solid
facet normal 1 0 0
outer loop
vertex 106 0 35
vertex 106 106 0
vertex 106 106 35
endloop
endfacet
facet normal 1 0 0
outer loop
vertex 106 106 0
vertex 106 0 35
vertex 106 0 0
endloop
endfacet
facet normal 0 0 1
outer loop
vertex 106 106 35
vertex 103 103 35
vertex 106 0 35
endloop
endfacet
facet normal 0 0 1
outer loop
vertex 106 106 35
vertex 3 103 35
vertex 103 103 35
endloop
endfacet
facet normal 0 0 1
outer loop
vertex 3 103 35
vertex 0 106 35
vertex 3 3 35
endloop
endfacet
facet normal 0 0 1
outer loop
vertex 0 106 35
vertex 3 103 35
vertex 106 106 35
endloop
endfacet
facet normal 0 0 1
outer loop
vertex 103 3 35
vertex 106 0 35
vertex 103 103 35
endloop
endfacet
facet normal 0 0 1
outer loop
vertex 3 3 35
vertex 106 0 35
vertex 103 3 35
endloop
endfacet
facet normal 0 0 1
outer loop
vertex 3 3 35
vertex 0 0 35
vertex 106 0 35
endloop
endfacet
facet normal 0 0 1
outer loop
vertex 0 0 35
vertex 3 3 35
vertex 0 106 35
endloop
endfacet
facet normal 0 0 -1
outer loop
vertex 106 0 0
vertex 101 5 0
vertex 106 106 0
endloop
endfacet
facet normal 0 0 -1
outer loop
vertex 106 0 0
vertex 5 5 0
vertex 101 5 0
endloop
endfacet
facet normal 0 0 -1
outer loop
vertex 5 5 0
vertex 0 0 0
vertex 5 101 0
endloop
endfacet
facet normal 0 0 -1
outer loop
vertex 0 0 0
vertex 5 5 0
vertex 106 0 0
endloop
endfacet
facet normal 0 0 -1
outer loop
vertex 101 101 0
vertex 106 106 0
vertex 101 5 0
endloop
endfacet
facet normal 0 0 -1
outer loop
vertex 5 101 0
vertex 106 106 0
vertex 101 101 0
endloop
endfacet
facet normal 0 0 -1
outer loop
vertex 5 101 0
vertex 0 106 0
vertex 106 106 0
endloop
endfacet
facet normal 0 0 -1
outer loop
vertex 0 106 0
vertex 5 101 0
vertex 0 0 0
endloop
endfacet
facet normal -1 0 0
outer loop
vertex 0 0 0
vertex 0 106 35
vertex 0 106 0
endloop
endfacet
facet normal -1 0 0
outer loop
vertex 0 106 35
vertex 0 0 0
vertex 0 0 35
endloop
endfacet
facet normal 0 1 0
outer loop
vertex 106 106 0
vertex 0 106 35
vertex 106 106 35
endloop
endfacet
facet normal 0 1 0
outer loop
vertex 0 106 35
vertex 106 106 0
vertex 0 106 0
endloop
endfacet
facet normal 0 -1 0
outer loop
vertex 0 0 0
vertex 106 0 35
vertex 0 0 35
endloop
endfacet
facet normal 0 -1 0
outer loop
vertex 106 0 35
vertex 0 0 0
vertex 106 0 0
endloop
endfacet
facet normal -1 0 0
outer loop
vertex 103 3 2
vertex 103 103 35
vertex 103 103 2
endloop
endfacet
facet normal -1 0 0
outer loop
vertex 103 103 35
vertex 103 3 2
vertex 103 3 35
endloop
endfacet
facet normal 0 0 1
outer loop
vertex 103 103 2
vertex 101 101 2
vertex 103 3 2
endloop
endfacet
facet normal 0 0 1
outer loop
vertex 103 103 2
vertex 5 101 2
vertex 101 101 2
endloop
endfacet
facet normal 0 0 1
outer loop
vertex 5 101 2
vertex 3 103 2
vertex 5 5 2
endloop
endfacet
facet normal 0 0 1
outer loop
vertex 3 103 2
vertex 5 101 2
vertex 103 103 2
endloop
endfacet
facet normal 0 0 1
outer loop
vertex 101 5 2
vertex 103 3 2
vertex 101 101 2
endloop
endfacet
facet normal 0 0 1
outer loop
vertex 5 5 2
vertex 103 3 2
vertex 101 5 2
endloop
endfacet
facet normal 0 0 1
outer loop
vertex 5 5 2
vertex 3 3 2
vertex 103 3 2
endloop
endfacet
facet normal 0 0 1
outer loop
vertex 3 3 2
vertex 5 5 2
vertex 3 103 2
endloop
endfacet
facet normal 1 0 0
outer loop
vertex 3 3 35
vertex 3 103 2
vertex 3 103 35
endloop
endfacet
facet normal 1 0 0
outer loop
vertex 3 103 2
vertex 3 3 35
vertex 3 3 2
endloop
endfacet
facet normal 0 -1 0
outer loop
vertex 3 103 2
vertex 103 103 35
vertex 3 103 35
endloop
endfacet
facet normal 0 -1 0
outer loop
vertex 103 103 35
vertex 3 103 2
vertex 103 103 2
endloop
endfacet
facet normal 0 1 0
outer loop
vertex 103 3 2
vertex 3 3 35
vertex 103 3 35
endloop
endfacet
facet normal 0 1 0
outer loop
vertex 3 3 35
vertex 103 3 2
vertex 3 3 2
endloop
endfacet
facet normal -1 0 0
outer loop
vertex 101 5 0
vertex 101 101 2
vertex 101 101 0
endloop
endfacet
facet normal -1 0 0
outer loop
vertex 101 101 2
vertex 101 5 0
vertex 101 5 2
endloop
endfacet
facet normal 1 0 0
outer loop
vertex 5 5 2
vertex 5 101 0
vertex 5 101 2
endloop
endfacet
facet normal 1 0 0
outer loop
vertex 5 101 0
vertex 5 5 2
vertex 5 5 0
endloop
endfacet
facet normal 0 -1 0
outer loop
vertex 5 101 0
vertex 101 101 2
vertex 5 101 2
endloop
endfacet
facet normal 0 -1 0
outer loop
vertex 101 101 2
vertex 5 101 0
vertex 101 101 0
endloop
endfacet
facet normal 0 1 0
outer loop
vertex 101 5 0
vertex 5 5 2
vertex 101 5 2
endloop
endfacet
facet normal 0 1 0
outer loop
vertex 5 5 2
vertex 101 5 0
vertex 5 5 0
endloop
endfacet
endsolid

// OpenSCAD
// Original Layerline prototype. No LED holder until approved module is measured.
part="frame"; panel=100; wall=3; depth=35; clearance=.4;
if(part=="frame")difference(){cube([panel+2*wall,panel+2*wall,depth]);translate([wall,wall,2])cube([panel,panel,depth]);translate([wall+2,wall+2,-1])cube([panel-4,panel-4,4]);}
if(part=="back")cube([panel-clearance,panel-clearance,2]);
